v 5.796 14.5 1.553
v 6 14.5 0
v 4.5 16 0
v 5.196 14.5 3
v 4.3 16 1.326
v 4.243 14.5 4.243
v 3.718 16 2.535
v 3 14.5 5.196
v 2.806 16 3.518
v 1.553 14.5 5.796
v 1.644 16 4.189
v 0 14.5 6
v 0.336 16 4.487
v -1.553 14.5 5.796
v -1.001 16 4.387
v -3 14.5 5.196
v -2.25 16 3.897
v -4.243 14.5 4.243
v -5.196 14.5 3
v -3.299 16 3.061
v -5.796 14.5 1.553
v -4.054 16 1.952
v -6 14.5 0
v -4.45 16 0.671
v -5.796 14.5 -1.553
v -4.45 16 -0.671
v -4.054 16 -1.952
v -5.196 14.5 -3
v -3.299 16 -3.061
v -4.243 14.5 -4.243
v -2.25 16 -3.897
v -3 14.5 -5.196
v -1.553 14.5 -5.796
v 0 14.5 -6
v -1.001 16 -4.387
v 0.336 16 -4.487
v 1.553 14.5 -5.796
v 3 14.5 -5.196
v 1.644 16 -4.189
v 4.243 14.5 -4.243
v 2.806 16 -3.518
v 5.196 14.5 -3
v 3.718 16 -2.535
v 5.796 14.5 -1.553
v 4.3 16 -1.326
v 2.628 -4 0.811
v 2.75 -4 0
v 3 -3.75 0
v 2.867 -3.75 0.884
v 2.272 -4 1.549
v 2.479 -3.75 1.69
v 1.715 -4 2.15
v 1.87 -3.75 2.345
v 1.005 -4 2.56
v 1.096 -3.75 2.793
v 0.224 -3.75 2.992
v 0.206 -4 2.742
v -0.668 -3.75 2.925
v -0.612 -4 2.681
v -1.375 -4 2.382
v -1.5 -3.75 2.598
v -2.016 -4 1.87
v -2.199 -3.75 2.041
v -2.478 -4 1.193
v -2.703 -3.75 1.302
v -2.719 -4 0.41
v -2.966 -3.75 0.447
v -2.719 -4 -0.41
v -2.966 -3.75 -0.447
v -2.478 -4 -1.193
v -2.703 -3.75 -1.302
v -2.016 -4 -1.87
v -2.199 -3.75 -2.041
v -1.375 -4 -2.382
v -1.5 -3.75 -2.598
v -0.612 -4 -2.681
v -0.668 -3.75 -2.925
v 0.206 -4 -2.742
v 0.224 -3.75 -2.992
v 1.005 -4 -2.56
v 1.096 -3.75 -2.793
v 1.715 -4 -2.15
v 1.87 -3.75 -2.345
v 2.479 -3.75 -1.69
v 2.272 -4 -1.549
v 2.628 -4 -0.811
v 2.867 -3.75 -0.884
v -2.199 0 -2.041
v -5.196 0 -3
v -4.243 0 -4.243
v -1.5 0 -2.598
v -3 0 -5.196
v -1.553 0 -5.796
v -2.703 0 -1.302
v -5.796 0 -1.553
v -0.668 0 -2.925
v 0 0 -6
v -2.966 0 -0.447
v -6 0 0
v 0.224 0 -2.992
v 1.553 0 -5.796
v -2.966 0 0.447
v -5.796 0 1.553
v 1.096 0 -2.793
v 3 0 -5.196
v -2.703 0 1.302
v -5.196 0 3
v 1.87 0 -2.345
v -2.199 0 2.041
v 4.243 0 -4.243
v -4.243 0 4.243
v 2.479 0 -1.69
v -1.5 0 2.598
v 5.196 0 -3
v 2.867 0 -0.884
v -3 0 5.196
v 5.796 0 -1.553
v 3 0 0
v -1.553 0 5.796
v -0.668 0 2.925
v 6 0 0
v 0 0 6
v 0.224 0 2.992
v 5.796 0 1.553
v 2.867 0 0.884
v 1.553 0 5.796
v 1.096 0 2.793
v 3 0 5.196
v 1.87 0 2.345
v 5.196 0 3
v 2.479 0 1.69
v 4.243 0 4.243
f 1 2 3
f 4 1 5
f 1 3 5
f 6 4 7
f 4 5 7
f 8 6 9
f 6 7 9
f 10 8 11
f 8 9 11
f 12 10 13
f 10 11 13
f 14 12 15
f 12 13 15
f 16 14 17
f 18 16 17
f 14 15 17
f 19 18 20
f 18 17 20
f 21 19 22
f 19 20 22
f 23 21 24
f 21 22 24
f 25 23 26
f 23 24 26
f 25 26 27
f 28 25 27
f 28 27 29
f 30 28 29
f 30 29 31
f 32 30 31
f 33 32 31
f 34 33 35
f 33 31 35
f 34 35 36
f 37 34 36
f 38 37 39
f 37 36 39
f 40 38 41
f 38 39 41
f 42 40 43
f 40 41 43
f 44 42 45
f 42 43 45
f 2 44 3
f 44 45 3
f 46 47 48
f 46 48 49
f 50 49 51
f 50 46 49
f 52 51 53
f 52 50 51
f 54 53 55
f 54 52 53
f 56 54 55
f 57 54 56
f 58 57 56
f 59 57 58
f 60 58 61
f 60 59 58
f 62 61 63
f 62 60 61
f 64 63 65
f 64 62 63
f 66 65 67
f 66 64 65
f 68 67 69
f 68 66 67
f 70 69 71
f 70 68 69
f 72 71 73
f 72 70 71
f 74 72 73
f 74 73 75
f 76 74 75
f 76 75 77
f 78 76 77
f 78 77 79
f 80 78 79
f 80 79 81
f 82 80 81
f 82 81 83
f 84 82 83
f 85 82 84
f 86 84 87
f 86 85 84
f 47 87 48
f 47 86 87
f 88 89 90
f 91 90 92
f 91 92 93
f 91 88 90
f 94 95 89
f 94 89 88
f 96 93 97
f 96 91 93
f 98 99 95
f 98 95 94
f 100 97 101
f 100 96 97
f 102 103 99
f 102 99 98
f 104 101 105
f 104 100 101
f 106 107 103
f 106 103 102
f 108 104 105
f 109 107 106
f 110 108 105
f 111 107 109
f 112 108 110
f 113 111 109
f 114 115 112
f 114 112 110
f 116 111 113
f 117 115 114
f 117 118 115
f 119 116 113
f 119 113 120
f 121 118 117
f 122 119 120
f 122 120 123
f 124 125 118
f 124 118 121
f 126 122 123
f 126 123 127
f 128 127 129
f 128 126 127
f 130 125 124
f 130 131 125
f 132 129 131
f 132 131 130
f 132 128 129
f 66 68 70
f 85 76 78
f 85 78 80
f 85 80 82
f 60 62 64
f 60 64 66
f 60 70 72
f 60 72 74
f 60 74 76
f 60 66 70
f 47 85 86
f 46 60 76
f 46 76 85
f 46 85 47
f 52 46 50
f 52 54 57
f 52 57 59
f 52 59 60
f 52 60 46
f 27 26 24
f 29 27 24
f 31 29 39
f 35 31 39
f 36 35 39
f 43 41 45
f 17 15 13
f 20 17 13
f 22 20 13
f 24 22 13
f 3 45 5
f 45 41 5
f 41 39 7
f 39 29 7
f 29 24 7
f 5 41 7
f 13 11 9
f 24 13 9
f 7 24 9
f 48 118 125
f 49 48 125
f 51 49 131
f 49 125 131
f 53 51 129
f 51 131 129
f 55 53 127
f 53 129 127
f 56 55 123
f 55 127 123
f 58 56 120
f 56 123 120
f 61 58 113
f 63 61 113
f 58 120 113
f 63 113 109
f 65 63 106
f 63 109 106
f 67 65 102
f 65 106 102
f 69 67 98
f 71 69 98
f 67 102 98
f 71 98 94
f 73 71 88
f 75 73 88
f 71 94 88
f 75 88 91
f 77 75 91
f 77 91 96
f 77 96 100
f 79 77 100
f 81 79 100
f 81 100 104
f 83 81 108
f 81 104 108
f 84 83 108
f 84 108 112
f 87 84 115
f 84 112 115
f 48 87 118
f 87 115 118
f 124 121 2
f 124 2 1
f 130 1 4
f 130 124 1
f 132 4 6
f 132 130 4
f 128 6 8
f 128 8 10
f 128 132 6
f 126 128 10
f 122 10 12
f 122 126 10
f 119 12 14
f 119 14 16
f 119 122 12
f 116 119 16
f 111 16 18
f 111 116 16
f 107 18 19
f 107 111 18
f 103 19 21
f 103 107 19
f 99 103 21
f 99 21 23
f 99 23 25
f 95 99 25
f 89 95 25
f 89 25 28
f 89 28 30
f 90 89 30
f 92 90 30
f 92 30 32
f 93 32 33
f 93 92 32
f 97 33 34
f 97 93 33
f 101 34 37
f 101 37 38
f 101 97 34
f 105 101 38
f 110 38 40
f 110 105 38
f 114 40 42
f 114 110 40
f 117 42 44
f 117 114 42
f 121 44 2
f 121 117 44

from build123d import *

# Parameters (mm, degrees)
F0_R     = 6
F1_DEPTH = 16
F2_R     = 3
F3_DEPTH = 4
F4_SIZE  = 0.25
F5_SIZE  = 1.5


with BuildPart() as f1:
    # F0 (on Front) → F1 (new body)
    with BuildSketch(Plane.XZ):
        Circle(F0_R)
    extrude(amount=-F1_DEPTH)

    # F2 (on face) → F3 (join)
    with BuildSketch(Plane.XZ):
        Circle(F2_R)
    extrude(amount=F3_DEPTH)

    # F4
    f4_edges = [f1.edges().sort_by_distance(p)[0] for p in [
        (-3, -4, 0),
    ]]
    chamfer(f4_edges, length=F4_SIZE)

    # F5
    f5_edges = [f1.edges().sort_by_distance(p)[0] for p in [
        (-6, 16, 0),
    ]]
    chamfer(f5_edges, length=F5_SIZE)


solid = f1.part
